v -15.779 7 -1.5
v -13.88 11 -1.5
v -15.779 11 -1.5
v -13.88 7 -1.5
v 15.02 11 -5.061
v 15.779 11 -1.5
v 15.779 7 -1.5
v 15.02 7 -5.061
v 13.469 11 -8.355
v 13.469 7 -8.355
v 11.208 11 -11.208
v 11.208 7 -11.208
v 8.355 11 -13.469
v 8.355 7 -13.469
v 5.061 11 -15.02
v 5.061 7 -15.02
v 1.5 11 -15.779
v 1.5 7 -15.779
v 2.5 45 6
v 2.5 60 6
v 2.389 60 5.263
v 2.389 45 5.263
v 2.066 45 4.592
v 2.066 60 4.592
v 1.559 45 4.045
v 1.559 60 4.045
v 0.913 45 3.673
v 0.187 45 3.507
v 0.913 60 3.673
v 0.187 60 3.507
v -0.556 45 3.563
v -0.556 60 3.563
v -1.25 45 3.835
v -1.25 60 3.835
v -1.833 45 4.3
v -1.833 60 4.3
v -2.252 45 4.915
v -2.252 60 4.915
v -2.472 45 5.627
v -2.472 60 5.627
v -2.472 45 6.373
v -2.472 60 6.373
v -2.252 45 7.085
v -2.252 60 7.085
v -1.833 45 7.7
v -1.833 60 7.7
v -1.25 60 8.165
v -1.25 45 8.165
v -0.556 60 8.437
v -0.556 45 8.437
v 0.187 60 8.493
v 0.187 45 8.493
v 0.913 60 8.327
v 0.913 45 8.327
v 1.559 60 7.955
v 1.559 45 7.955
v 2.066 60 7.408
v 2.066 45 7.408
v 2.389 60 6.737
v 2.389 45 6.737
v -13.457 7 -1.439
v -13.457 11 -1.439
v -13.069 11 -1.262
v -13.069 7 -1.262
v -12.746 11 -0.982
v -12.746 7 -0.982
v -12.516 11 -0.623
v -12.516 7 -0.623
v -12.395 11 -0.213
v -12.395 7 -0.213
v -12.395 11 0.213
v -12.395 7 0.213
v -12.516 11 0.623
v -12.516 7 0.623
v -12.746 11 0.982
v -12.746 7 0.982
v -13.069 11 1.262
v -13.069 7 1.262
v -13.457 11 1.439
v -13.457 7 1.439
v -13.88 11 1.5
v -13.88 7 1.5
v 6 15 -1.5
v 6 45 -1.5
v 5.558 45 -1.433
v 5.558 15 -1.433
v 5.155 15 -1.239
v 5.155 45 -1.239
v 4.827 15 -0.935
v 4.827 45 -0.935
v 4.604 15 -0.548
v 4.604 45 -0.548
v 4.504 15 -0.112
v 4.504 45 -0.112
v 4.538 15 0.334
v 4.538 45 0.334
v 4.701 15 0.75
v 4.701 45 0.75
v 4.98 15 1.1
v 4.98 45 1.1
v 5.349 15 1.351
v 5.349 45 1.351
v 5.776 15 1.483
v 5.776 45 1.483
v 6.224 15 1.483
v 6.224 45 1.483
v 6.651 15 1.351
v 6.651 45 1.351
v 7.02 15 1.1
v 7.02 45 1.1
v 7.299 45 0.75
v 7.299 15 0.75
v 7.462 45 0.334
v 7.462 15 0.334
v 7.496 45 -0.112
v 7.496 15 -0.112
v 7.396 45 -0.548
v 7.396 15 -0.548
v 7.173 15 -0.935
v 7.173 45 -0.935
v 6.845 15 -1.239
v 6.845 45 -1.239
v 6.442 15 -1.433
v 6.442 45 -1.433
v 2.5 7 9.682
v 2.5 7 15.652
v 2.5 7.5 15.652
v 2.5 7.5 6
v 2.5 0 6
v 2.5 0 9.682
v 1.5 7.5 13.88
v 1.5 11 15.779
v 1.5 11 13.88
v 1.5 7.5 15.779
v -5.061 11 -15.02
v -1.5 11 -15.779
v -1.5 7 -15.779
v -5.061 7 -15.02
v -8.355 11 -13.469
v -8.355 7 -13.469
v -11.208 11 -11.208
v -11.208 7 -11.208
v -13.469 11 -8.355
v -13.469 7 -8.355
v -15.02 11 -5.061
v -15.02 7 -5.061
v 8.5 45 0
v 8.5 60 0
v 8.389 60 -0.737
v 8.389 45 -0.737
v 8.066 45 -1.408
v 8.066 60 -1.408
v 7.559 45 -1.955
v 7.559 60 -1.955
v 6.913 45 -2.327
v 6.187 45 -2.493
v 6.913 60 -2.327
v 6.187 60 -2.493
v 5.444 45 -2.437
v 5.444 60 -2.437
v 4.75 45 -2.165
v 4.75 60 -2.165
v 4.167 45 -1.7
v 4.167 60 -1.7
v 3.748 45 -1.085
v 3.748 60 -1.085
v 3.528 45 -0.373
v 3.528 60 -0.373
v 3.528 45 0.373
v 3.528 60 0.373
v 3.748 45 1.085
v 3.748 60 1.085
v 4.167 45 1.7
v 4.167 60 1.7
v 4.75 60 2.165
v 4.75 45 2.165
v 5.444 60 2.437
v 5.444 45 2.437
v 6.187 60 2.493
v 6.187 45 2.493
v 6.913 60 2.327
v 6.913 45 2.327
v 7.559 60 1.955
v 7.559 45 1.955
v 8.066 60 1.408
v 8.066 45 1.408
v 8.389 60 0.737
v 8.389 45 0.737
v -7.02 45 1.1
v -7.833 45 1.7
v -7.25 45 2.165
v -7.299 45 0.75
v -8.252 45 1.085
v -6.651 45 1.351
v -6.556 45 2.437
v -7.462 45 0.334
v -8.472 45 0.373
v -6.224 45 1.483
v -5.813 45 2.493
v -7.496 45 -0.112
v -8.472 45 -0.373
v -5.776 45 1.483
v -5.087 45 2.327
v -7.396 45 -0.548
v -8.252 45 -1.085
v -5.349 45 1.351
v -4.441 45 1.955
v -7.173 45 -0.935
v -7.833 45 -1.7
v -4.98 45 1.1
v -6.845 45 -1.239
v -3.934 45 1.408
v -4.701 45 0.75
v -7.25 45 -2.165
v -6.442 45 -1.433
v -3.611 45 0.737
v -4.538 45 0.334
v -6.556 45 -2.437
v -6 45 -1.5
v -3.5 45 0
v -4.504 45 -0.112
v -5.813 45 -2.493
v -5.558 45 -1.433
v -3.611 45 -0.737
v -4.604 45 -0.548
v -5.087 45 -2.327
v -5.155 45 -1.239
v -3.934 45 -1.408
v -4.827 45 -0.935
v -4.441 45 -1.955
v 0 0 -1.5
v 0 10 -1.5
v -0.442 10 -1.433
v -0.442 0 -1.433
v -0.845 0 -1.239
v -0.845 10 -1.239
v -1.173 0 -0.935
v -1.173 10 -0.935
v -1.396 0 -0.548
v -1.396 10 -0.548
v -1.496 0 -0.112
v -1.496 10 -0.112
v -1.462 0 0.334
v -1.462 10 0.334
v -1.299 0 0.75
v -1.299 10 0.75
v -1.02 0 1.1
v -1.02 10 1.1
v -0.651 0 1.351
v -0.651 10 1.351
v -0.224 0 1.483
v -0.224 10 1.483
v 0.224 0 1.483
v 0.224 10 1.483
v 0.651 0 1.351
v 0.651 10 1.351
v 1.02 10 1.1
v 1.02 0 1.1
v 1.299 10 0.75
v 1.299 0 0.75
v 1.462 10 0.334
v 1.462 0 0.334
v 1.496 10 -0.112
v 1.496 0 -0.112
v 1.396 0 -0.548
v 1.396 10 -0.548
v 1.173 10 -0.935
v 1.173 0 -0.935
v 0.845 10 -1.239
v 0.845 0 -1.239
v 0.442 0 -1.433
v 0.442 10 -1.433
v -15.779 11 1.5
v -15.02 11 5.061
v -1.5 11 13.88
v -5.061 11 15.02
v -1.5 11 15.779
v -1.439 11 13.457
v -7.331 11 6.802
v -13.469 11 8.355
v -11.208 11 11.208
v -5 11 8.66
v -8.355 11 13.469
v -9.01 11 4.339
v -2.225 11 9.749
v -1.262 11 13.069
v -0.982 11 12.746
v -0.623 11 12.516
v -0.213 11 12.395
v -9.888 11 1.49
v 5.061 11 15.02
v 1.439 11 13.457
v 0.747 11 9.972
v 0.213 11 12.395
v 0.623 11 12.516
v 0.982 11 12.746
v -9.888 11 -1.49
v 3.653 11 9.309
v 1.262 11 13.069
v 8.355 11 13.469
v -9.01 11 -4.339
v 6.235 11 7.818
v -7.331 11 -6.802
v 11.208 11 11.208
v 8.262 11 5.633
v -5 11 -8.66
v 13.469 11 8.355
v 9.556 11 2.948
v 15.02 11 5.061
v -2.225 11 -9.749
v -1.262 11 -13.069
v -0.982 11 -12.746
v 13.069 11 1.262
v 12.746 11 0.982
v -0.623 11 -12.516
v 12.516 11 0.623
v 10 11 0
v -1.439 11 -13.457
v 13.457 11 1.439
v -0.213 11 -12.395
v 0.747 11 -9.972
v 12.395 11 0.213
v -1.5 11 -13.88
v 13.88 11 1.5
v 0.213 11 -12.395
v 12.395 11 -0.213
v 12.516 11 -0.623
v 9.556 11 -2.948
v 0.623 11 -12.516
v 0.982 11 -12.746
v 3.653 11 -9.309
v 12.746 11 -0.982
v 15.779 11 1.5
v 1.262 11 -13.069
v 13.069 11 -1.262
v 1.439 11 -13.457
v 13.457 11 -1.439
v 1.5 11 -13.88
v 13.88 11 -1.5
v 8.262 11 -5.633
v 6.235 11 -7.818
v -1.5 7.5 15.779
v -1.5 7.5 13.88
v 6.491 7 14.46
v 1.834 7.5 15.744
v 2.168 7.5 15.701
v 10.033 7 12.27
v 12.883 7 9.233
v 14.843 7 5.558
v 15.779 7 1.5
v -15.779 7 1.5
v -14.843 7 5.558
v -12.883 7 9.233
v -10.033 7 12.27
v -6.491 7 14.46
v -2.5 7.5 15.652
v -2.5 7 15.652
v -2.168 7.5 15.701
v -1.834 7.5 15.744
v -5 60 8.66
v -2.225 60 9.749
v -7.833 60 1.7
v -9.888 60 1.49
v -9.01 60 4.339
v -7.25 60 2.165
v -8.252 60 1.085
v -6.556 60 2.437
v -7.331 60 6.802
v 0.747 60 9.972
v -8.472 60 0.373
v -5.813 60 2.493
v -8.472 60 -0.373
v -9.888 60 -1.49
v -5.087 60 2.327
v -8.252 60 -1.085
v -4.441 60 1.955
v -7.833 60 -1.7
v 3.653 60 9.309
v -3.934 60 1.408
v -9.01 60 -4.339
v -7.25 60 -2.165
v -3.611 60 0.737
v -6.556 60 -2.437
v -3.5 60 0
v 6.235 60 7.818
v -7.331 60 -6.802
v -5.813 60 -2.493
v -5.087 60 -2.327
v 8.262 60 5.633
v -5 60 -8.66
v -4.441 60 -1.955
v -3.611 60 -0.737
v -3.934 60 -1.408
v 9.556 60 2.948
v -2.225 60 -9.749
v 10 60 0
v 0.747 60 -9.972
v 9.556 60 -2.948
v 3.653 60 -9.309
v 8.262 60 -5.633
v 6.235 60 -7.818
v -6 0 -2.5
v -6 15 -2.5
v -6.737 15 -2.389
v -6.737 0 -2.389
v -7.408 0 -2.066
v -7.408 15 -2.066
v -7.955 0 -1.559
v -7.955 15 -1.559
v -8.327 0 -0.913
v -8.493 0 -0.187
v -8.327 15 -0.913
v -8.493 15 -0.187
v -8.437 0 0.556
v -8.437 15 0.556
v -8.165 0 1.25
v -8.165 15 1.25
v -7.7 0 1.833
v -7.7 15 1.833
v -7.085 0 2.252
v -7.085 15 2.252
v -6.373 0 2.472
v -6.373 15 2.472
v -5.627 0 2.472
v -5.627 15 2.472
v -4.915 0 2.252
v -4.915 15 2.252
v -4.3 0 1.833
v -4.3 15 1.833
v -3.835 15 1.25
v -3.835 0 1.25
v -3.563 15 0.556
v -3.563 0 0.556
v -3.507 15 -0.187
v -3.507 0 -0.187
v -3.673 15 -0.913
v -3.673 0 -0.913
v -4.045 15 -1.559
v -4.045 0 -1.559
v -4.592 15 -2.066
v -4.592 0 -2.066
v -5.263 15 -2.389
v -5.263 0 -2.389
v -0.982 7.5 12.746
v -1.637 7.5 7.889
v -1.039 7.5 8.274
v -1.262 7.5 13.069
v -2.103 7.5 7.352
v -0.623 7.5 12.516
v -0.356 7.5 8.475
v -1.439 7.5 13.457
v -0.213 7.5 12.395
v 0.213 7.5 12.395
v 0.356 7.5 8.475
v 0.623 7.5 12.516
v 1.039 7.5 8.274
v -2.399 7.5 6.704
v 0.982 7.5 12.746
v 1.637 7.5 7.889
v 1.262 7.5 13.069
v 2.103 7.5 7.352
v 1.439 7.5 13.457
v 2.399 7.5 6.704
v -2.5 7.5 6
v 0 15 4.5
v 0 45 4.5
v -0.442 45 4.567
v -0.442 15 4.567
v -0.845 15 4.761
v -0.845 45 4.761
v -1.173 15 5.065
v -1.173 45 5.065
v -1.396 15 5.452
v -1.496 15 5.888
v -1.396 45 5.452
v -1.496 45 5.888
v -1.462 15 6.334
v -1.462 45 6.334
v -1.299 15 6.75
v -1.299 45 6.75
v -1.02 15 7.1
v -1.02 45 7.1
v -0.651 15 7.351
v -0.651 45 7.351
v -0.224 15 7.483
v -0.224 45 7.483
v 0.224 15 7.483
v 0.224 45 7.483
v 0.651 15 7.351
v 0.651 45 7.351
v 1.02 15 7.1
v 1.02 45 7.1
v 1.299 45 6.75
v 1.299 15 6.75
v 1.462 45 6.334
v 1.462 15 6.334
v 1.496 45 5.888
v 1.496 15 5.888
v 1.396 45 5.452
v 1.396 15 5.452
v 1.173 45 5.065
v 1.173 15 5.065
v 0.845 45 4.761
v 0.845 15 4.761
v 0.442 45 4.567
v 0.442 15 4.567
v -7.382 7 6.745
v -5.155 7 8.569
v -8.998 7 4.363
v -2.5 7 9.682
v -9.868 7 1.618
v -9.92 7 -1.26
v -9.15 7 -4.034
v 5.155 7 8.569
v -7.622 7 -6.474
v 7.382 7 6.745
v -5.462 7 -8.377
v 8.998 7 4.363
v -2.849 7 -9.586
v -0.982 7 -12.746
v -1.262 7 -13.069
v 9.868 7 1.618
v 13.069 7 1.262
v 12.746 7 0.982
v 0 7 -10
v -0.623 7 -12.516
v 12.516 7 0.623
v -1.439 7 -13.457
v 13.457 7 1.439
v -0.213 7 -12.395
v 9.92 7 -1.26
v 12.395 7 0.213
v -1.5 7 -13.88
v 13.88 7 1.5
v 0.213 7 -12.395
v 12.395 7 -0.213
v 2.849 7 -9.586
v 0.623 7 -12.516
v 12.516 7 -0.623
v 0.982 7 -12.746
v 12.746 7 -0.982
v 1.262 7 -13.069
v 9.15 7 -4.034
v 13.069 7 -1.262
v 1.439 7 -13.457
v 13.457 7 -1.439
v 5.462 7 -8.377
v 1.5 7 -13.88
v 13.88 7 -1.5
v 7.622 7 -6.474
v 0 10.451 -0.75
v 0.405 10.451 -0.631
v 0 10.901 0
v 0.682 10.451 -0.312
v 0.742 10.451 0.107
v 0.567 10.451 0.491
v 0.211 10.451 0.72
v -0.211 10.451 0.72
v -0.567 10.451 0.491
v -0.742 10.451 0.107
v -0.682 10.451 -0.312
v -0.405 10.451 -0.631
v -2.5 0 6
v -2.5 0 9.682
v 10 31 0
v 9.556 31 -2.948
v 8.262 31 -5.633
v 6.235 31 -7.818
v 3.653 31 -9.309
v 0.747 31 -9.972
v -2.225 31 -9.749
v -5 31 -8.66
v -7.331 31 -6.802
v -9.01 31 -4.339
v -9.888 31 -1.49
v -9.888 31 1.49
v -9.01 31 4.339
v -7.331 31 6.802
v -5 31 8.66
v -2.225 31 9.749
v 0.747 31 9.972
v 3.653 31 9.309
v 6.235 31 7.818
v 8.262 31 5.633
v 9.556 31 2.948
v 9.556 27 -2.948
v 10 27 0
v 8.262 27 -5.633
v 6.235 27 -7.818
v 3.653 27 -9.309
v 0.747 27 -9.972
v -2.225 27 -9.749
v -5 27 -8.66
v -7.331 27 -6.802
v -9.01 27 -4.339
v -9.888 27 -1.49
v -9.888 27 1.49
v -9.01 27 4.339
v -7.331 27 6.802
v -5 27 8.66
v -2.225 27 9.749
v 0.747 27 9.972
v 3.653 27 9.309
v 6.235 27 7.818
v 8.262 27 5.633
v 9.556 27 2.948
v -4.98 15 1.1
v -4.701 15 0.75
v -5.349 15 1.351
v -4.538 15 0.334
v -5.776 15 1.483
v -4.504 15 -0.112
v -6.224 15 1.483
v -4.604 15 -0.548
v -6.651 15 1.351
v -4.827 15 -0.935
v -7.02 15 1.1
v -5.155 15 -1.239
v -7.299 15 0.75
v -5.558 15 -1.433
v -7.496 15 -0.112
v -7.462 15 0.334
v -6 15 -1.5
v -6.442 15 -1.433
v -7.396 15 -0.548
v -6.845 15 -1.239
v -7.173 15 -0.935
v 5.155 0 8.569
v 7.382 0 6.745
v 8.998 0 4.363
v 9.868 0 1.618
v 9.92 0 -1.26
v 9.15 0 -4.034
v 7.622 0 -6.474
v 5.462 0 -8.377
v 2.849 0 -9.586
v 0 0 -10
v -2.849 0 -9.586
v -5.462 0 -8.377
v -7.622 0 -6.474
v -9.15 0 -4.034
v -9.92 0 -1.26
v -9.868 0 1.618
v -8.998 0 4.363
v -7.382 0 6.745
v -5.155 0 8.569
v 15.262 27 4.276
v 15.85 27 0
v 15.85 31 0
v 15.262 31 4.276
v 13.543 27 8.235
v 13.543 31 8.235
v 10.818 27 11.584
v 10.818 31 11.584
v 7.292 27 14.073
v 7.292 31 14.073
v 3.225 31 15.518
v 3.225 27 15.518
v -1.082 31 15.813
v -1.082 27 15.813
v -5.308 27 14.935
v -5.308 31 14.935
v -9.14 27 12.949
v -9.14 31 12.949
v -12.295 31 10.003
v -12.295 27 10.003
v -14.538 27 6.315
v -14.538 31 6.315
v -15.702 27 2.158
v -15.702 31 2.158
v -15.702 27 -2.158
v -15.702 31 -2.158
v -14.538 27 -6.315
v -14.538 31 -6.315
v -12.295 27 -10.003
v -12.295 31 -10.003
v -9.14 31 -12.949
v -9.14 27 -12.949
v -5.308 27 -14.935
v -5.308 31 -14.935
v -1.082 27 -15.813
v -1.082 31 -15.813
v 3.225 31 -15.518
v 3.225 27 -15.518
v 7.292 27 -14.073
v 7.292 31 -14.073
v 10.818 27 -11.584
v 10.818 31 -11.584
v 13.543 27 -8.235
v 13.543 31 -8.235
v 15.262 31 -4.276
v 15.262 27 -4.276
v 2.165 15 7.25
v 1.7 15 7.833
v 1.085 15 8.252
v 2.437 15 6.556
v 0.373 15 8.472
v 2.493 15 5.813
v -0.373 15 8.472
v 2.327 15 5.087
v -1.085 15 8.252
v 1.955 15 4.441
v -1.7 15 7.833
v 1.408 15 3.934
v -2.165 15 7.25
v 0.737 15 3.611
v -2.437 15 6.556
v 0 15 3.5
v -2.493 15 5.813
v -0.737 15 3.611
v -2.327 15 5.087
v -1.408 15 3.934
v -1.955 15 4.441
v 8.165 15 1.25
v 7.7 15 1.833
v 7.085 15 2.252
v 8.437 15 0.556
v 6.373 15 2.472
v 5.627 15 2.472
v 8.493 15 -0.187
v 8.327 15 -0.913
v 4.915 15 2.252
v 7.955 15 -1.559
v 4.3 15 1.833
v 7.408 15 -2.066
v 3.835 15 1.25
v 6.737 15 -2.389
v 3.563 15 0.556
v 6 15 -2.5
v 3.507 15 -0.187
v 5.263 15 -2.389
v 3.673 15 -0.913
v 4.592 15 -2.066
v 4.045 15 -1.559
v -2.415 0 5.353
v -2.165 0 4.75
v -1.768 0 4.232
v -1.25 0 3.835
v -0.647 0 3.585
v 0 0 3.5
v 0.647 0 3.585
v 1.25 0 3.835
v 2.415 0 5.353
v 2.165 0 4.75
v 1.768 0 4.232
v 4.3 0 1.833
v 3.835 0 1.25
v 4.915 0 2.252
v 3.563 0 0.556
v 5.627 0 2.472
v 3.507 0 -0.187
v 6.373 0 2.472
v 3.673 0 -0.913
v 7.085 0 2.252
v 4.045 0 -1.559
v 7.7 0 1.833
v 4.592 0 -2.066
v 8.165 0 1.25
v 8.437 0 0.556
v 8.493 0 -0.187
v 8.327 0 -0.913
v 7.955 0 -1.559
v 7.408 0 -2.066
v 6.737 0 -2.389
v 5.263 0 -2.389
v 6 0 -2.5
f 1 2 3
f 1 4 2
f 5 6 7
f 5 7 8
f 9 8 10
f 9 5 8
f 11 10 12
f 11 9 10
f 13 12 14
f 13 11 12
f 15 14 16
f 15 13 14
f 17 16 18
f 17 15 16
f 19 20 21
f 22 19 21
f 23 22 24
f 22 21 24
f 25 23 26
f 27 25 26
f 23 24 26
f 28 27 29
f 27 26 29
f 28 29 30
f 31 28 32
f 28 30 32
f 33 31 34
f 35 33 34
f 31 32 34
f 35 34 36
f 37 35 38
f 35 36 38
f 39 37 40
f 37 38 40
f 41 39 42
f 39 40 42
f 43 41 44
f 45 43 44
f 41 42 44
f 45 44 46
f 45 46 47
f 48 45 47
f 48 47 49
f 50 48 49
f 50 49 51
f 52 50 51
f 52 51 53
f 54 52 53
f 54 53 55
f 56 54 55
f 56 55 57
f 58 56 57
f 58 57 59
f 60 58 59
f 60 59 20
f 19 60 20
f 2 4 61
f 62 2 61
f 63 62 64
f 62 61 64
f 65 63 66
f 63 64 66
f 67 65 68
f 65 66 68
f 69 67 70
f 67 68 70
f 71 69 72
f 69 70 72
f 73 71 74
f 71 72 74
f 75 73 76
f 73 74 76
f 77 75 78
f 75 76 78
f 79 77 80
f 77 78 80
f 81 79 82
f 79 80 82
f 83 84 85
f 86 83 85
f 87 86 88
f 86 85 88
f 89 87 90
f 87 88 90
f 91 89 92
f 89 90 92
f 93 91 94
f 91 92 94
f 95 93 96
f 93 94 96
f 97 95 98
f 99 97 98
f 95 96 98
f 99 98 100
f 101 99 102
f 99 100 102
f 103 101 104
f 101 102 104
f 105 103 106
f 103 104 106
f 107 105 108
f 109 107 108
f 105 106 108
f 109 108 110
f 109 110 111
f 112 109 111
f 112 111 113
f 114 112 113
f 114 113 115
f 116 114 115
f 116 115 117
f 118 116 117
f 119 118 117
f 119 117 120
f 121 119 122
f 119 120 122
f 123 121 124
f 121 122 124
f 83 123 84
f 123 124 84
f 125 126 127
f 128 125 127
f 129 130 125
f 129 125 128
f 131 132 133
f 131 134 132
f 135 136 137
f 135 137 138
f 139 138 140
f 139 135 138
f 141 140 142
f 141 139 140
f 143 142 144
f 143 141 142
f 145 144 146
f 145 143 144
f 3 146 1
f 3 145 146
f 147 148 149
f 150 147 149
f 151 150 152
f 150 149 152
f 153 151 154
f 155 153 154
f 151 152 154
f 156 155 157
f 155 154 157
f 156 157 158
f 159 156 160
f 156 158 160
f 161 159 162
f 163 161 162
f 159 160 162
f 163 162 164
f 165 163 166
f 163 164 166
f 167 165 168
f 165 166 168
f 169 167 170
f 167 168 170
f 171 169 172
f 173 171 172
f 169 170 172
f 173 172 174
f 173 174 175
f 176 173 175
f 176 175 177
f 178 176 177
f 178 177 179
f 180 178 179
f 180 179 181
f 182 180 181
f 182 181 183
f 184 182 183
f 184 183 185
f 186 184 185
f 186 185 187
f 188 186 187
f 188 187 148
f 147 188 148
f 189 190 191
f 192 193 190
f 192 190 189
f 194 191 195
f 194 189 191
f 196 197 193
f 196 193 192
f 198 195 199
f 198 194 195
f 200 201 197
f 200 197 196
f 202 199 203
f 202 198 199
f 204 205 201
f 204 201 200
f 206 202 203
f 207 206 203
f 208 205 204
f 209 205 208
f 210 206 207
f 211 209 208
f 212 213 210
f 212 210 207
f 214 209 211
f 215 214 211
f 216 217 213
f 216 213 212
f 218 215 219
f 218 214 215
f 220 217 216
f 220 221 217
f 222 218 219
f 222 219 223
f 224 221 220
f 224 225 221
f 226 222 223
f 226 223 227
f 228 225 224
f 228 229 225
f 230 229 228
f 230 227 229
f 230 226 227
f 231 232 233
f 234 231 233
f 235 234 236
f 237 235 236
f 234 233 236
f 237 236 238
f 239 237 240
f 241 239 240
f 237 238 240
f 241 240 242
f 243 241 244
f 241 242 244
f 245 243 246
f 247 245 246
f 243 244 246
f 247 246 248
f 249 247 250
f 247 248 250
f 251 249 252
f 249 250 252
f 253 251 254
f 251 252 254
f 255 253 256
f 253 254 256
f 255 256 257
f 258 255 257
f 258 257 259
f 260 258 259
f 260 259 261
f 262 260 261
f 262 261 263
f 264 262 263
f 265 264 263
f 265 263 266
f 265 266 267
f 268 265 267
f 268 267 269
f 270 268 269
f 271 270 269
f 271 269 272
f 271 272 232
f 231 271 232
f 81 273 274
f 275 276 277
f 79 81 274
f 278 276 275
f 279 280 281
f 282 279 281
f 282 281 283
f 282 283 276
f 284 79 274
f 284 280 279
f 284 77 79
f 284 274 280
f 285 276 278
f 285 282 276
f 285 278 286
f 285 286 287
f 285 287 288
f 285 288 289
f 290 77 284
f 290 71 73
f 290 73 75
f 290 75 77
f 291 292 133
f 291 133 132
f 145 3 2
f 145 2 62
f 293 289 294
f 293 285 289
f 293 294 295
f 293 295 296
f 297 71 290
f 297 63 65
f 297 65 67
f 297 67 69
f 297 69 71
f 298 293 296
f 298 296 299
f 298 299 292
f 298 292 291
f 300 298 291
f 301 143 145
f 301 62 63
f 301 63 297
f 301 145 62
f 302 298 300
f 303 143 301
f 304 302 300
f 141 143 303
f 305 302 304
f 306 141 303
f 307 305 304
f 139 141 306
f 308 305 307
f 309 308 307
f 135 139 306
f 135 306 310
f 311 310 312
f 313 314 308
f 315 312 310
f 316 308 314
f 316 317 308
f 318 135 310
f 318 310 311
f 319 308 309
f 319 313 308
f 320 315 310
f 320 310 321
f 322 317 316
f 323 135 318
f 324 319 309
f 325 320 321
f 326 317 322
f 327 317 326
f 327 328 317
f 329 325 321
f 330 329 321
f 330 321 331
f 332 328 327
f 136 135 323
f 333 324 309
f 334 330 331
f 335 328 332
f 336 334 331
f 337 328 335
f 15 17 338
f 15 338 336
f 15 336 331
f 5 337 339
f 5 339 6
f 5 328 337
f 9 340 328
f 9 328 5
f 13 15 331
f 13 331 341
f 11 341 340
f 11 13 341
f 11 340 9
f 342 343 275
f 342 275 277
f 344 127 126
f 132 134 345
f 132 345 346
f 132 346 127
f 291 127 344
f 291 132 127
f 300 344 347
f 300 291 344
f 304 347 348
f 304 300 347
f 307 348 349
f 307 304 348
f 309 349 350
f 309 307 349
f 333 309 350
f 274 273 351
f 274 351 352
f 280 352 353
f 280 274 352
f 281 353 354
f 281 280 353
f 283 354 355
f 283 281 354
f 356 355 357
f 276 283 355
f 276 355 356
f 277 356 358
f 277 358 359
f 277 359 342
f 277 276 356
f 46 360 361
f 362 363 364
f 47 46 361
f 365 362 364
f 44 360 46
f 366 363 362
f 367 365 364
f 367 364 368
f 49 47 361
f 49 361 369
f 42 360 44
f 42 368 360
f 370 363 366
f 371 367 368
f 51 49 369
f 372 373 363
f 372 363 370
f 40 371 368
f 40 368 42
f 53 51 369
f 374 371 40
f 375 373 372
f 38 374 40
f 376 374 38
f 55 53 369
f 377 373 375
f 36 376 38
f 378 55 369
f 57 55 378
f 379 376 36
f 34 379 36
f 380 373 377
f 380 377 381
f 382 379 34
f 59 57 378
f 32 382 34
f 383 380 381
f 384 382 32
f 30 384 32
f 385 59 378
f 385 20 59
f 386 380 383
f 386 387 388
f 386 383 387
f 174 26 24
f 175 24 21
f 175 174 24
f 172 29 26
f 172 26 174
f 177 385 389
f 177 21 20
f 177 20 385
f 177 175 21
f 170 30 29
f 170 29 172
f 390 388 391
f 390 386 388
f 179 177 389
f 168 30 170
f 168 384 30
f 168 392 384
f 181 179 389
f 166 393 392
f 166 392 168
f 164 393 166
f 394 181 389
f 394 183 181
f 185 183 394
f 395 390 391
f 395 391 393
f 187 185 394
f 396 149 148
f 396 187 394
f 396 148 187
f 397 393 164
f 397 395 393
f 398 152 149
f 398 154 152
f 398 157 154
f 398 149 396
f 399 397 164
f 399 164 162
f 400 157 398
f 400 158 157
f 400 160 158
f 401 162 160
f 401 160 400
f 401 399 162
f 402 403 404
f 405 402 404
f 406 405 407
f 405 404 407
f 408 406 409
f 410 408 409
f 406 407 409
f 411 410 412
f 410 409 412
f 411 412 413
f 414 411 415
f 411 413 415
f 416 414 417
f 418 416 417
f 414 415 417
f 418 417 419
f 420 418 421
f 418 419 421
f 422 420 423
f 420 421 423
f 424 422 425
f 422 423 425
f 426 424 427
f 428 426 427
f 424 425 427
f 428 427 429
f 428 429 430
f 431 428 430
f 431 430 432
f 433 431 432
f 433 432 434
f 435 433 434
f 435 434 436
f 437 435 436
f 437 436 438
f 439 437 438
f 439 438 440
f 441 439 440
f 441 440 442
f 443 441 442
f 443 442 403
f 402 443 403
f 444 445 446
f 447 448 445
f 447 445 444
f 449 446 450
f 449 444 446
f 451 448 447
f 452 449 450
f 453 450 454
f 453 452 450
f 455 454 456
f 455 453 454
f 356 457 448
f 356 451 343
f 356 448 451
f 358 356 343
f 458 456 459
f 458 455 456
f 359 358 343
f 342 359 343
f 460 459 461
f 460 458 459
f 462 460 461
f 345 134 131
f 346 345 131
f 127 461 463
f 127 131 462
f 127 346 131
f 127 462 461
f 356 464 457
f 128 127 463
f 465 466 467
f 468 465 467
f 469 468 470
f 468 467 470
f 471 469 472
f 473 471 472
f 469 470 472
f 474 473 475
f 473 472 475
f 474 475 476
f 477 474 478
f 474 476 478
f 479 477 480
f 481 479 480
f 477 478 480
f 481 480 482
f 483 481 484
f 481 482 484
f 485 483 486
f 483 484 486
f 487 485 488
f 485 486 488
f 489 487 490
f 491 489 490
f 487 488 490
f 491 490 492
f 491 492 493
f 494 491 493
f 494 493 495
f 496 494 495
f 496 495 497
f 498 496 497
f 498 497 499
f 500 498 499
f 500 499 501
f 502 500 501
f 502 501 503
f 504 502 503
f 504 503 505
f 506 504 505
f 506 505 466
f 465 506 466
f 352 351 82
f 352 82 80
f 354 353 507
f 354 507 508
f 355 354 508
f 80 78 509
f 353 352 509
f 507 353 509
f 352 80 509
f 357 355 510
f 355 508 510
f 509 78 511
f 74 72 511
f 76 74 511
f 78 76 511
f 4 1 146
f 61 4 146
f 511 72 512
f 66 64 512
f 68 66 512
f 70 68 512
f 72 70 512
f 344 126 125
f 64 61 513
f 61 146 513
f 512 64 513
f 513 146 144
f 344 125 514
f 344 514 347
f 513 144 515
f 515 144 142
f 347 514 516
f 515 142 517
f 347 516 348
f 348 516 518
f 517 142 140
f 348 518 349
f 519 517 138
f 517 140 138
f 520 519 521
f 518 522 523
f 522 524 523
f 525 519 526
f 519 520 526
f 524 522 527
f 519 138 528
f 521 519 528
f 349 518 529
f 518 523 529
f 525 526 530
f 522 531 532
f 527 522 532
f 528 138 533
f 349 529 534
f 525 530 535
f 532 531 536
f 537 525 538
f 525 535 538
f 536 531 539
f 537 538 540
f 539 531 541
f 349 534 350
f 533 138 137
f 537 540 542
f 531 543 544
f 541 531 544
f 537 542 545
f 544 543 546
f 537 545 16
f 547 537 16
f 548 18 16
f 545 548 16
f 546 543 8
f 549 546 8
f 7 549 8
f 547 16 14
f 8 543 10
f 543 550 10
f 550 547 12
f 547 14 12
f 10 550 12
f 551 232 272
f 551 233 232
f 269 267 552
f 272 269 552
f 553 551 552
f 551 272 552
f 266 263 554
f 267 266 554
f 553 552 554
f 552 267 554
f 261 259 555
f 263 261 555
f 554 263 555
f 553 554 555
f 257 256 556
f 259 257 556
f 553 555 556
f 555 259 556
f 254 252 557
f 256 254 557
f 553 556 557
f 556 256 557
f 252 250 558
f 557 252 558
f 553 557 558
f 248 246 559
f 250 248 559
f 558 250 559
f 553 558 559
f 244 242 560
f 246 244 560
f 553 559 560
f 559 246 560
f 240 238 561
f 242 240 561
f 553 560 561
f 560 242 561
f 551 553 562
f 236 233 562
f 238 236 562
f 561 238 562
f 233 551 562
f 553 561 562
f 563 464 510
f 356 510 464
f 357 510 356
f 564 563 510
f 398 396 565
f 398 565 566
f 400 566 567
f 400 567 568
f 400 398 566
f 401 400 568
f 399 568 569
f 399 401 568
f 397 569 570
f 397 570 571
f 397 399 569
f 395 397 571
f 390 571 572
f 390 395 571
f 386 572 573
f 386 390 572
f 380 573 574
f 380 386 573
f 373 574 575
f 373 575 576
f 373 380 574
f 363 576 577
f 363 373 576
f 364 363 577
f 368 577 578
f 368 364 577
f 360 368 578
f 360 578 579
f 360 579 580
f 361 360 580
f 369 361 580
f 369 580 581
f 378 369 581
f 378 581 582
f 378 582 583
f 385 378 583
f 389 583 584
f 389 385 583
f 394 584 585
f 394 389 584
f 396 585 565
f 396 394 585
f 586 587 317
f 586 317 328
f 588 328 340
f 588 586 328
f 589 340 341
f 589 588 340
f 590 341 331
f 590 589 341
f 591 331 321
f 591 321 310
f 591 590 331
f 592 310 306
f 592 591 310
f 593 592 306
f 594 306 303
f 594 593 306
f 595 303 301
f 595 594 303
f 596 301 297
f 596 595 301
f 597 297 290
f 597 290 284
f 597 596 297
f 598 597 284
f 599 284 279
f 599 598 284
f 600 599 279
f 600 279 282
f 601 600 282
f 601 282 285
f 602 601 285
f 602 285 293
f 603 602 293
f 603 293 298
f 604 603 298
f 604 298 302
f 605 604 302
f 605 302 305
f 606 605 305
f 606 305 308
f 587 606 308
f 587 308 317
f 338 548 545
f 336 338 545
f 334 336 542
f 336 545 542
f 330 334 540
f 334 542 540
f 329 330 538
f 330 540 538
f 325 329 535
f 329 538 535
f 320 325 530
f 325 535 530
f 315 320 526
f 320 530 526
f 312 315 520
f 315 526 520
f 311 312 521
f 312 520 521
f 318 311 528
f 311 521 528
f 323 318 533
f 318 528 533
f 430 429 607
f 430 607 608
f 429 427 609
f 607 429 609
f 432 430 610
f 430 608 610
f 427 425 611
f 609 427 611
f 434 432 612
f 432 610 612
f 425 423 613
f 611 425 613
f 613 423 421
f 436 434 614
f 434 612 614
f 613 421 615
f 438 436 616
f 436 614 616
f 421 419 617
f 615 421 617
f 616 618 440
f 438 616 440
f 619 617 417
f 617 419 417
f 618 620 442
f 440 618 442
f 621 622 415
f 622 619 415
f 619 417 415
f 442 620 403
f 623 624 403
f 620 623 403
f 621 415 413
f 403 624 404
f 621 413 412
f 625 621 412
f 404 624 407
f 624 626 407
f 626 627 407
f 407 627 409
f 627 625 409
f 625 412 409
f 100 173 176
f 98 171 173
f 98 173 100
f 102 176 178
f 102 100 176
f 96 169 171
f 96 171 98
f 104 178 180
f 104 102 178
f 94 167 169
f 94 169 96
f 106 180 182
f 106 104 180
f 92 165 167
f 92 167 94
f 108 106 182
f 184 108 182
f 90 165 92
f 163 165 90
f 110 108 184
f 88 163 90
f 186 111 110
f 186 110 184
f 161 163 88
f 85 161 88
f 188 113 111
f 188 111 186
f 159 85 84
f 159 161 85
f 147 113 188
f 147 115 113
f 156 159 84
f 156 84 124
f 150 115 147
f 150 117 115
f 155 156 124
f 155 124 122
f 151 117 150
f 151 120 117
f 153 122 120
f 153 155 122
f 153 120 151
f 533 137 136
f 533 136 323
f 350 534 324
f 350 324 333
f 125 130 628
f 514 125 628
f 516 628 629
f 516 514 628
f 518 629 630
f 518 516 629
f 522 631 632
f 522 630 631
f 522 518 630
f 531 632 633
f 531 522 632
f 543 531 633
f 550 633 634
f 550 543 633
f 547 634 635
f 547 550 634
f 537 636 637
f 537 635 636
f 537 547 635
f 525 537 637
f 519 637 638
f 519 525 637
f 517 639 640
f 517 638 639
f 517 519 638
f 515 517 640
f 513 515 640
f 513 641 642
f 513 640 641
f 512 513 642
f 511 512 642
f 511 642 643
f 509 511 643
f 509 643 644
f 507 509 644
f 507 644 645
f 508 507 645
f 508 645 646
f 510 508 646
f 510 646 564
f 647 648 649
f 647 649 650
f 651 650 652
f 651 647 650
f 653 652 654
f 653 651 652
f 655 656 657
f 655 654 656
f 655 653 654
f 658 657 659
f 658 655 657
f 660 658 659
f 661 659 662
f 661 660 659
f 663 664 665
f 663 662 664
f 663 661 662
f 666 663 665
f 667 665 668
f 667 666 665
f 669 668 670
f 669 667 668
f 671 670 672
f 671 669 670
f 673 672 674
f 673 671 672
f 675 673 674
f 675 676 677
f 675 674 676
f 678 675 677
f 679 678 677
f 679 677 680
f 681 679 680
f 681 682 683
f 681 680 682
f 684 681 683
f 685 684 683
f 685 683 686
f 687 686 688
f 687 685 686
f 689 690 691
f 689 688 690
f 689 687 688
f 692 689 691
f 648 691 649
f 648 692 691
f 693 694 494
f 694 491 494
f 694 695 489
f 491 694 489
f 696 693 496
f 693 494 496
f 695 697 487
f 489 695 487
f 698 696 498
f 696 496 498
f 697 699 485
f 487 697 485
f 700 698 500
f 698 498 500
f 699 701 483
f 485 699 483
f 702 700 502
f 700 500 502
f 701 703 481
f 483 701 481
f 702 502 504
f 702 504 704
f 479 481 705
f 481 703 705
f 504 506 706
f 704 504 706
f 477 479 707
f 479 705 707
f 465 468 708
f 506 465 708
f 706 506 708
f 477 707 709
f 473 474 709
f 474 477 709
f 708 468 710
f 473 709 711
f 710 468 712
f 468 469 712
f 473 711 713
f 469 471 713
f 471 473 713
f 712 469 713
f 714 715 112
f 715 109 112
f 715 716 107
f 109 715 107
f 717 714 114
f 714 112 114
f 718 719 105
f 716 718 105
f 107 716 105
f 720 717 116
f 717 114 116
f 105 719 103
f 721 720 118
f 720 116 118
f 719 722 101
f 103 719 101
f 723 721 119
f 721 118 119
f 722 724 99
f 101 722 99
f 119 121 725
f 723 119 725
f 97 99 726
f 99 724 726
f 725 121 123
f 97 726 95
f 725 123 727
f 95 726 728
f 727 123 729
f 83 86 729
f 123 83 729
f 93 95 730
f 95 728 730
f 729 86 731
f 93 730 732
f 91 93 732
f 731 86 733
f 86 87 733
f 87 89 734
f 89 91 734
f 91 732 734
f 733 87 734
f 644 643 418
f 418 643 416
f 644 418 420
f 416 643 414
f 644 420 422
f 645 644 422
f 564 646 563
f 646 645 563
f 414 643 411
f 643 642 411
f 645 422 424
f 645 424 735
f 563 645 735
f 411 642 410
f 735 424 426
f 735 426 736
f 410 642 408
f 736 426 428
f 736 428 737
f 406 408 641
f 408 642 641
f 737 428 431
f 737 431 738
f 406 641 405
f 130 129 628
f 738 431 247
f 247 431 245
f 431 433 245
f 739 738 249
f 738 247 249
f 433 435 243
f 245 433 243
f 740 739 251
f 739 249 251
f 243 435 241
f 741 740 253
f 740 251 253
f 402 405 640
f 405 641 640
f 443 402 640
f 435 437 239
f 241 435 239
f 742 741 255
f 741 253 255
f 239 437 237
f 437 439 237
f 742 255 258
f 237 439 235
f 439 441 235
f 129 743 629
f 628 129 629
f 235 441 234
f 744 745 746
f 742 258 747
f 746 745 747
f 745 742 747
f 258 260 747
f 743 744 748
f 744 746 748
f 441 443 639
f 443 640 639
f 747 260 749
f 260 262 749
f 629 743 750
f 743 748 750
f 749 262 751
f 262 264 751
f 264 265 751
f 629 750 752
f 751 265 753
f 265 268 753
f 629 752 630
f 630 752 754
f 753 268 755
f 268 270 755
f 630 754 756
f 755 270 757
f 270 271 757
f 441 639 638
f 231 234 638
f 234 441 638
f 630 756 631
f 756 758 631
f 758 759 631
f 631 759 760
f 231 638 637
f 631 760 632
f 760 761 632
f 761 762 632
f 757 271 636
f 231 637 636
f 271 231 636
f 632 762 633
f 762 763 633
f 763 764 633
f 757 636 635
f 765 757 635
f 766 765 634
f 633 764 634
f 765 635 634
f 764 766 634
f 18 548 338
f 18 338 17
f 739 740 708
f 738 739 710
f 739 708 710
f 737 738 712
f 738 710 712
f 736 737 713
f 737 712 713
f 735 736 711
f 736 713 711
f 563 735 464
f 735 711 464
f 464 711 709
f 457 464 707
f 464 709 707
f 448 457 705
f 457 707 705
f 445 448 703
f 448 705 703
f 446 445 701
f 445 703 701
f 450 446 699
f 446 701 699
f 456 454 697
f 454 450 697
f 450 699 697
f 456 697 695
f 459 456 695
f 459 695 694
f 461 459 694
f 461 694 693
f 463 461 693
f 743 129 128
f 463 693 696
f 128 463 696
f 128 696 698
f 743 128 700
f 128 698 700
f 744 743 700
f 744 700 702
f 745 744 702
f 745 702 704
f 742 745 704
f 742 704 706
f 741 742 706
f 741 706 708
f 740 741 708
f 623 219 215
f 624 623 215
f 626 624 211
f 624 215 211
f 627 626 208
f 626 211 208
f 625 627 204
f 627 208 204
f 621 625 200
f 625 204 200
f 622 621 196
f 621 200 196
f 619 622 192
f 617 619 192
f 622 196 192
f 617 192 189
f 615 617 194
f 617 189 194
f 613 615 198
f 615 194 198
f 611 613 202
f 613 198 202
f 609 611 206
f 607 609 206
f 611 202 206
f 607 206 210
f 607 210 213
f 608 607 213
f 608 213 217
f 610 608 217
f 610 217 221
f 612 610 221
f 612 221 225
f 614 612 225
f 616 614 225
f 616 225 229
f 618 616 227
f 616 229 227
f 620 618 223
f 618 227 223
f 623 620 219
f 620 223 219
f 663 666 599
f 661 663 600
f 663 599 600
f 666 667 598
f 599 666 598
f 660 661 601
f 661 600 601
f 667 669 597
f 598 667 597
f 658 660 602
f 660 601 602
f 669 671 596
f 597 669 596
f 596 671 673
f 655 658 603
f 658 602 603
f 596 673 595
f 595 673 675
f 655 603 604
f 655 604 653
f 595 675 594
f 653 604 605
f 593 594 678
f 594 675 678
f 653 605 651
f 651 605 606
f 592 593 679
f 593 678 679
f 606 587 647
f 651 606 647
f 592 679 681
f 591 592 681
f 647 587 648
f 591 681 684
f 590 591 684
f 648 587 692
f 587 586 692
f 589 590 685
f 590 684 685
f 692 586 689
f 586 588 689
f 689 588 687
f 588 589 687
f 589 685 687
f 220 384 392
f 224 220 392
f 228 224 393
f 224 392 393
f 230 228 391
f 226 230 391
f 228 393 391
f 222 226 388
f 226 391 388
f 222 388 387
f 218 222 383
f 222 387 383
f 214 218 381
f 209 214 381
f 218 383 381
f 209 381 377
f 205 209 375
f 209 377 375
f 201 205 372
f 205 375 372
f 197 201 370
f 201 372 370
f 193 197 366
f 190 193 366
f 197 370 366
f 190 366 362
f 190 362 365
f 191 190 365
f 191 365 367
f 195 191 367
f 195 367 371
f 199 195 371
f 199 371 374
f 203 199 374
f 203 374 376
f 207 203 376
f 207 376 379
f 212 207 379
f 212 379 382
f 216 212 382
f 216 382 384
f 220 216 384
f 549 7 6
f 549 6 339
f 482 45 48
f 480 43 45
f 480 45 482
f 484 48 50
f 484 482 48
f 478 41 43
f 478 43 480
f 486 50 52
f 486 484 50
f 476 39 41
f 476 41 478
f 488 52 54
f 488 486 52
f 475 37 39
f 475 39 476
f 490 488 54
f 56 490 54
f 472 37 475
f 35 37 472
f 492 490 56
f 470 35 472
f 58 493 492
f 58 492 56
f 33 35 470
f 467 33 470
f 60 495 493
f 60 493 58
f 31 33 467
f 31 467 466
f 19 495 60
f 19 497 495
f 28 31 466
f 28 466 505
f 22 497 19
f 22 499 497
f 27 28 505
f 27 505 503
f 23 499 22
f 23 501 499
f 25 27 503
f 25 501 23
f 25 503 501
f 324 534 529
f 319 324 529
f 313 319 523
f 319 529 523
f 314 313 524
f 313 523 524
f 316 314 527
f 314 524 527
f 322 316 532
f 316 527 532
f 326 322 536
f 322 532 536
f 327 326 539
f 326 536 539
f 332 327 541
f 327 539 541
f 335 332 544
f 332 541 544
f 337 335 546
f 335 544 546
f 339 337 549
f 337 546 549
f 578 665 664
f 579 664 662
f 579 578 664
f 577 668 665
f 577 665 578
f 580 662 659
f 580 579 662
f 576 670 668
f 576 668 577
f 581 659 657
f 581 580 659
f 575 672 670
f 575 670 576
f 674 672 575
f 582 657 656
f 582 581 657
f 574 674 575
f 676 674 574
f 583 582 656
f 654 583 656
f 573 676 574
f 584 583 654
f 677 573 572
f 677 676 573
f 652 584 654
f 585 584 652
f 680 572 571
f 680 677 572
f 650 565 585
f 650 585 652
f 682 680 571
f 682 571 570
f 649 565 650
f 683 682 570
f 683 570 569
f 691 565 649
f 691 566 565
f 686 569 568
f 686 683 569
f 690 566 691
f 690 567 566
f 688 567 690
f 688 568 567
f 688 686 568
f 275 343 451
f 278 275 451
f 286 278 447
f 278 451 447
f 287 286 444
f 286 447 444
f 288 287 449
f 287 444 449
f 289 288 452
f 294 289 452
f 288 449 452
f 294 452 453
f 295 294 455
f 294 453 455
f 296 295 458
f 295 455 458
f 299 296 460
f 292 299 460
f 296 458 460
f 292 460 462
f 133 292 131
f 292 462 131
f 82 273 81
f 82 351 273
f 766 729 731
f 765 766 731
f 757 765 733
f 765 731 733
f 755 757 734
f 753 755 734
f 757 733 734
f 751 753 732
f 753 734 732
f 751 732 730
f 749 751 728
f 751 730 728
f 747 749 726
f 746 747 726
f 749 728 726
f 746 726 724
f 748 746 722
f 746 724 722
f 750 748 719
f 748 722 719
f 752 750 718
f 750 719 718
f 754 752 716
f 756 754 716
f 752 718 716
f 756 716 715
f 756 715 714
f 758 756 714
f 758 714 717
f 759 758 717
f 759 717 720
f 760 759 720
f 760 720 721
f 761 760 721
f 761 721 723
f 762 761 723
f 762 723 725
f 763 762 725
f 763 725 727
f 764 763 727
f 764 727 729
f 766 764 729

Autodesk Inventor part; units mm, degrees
ref_plane "YZ Plane" through (0, 0, 0) normal (1, 0, 0) x (0, 1, 0)
ref_plane "XZ Plane" through (0, 0, 0) normal (0, 1, 0) x (-1, 0, 0)
ref_plane "XY Plane" through (0, 0, 0) normal (0, 0, 1) x (1, 0, 0)
sketch "Sketch5" plane through (0, 0, 0) normal (0, 0, 1) x (1, 0, 0)
  line L0 (0, 0) -> (0, 60)
  line L1 (0, 0) -> (10, 0)
  line L2 (10, 0) -> (10, 7)
  line L3 (10, 7) -> (15.85, 7)
  line L4 (15.85, 7) -> (15.85, 11)
  line L5 (15.85, 11) -> (10, 11)
  line L6 (10, 11) -> (10, 27)
  line L7 (10, 27) -> (15.85, 27)
  line L8 (15.85, 31) -> (10, 31)
  line L9 (10, 31) -> (10, 60)
  line L10 (10, 60) -> (0, 60)
  line L11 (15.85, 31) -> (15.85, 27)
  dimension "d17" = 31.7
  dimension "d18" = 7
  dimension "d19" = 4
  dimension "d23" = 20
  dimension "d26" = 60
  dimension "d27" = 20
  dimension "d48" = 31.7
  dimension "d49" = 16
  dimension "d50" = 4
revolve "Revolution1" add sketch "Sketch5" angle 360 about axis through (0, 0, 0) along (0, 1, 0)
sketch "Sketch6" plane through (0, 0, 0) normal (0, -1, 0) x (1, 0, 0)
  line L0 (-6, 0) -> (6, 0)
  circle A0 centre (0, 6) radius 4
  point P0 (0, 0)
  point P1 (6, 0)
  point P2 (0, 0)
  dimension "d29" = 12
  dimension "d56" = 8
  dimension "d57" = 6
hole "Hole2" at (6, 0, 0) at (-6, 0, 0) at (0, 0, 6) direction (0, 1, 0) diameter 3 end through all counterbore diameter 5 counterbore depth 15
sketch "Sketch8" plane through (0, 7, 0) normal (0, -1, 0) x (1, 0, 0)
  line L0 (-17.88, 0) -> (-13.88, 0) construction
  line L1 (-17.88, 1.5) -> (-13.88, 1.5)
  line L2 (-13.88, -1.5) -> (-17.88, -1.5)
  arc A0 (-17.88, 1.5) -> (-17.88, -1.5) centre (-17.88, 0) ccw
  arc A1 (-13.88, -1.5) -> (-13.88, 1.5) centre (-13.88, 0) ccw
  point P0 (0, 0)
  point P1 (-15.88, 0)
  dimension "d40" = 13.88
  dimension "d41" = 1.5
  dimension "d42" = 4
extrude "Extrusion5" cut sketch "Sketch8" against normal up to surface (4 mm away)
pattern_circular "Circular Pattern1" count 4 over 360 about axis through (0, 3.5, 0) along (0, 1, 0) of "Extrusion5"
sketch "Sketch9" plane through (0, 60, 0) normal (0, 1, 0) x (1, 0, 0)
  circle A0 centre (-6, 0) radius 1.5 projected
  circle A1 centre (6, 0) radius 1.5 projected
  circle A2 centre (-6, 0) radius 2.5
  circle A3 centre (6, 0) radius 1.5 projected
  circle A4 centre (6, 0) radius 2.5
  circle A5 centre (0, -6) radius 1.5 projected
  circle A6 centre (0, -6) radius 1.5 projected
  circle A7 centre (0, -6) radius 2.5
  point P0 (0, 0)
  point P1 (0, 0)
  dimension "d51" = 5
  dimension "d53" = 5
  dimension "d68" = 5
extrude "Extrusion6" cut sketch "Sketch9" against normal blind 15 contours A2 | A4 | A5 | A7
sketch "Sketch10" plane through (0, 0, 0) normal (0, -1, 0) x (1, 0, 0)
  point P0 (0, 0)
  point P1 (0, 0)
hole "Hole3" at (0, 0, 0) direction (0, 1, 0) diameter 3 depth 10 tip angle 118
sketch "Sketch11" plane through (0, 0, 0) normal (0, -1, 0) x (1, 0, 0)
  circle A0 centre (0, 6) radius 2.5 projected
  line L0 (0, 6) -> (0, 17) construction
  line L1 (-2.5, 6) -> (-2.5, 17)
  line L2 (2.5, 17) -> (2.5, 6)
  arc A1 (-2.5, 6) -> (2.5, 6) centre (0, 6) ccw
  arc A2 (2.5, 17) -> (-2.5, 17) centre (0, 17) ccw
  point P0 (0, 0)
  point P1 (0, 11.5)
  point P2 (-2.5, 6)
  point P3 (2.5, 6)
  dimension "d65" = 11
extrude "Extrusion7" cut sketch "Sketch11" against normal blind 7.5 contours A0 L1 A2 L2
properties part number "033" material "Glass"
